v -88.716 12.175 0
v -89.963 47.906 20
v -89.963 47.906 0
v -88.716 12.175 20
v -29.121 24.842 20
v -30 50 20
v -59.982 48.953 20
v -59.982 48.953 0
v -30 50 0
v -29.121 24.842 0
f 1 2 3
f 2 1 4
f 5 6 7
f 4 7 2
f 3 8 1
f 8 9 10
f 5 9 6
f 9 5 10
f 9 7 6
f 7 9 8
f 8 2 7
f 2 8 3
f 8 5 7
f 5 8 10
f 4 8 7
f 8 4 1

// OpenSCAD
translate([-30,50,0])
scale([3,3,1])
rotate([0,0,+182]) {
    difference() {
        cube([20, 20, 20]);
        translate([10, 0, -1]) {
            rotate([0,0,50]) {
                cube([30, 30, 30]);
            }
        }
    }
}
